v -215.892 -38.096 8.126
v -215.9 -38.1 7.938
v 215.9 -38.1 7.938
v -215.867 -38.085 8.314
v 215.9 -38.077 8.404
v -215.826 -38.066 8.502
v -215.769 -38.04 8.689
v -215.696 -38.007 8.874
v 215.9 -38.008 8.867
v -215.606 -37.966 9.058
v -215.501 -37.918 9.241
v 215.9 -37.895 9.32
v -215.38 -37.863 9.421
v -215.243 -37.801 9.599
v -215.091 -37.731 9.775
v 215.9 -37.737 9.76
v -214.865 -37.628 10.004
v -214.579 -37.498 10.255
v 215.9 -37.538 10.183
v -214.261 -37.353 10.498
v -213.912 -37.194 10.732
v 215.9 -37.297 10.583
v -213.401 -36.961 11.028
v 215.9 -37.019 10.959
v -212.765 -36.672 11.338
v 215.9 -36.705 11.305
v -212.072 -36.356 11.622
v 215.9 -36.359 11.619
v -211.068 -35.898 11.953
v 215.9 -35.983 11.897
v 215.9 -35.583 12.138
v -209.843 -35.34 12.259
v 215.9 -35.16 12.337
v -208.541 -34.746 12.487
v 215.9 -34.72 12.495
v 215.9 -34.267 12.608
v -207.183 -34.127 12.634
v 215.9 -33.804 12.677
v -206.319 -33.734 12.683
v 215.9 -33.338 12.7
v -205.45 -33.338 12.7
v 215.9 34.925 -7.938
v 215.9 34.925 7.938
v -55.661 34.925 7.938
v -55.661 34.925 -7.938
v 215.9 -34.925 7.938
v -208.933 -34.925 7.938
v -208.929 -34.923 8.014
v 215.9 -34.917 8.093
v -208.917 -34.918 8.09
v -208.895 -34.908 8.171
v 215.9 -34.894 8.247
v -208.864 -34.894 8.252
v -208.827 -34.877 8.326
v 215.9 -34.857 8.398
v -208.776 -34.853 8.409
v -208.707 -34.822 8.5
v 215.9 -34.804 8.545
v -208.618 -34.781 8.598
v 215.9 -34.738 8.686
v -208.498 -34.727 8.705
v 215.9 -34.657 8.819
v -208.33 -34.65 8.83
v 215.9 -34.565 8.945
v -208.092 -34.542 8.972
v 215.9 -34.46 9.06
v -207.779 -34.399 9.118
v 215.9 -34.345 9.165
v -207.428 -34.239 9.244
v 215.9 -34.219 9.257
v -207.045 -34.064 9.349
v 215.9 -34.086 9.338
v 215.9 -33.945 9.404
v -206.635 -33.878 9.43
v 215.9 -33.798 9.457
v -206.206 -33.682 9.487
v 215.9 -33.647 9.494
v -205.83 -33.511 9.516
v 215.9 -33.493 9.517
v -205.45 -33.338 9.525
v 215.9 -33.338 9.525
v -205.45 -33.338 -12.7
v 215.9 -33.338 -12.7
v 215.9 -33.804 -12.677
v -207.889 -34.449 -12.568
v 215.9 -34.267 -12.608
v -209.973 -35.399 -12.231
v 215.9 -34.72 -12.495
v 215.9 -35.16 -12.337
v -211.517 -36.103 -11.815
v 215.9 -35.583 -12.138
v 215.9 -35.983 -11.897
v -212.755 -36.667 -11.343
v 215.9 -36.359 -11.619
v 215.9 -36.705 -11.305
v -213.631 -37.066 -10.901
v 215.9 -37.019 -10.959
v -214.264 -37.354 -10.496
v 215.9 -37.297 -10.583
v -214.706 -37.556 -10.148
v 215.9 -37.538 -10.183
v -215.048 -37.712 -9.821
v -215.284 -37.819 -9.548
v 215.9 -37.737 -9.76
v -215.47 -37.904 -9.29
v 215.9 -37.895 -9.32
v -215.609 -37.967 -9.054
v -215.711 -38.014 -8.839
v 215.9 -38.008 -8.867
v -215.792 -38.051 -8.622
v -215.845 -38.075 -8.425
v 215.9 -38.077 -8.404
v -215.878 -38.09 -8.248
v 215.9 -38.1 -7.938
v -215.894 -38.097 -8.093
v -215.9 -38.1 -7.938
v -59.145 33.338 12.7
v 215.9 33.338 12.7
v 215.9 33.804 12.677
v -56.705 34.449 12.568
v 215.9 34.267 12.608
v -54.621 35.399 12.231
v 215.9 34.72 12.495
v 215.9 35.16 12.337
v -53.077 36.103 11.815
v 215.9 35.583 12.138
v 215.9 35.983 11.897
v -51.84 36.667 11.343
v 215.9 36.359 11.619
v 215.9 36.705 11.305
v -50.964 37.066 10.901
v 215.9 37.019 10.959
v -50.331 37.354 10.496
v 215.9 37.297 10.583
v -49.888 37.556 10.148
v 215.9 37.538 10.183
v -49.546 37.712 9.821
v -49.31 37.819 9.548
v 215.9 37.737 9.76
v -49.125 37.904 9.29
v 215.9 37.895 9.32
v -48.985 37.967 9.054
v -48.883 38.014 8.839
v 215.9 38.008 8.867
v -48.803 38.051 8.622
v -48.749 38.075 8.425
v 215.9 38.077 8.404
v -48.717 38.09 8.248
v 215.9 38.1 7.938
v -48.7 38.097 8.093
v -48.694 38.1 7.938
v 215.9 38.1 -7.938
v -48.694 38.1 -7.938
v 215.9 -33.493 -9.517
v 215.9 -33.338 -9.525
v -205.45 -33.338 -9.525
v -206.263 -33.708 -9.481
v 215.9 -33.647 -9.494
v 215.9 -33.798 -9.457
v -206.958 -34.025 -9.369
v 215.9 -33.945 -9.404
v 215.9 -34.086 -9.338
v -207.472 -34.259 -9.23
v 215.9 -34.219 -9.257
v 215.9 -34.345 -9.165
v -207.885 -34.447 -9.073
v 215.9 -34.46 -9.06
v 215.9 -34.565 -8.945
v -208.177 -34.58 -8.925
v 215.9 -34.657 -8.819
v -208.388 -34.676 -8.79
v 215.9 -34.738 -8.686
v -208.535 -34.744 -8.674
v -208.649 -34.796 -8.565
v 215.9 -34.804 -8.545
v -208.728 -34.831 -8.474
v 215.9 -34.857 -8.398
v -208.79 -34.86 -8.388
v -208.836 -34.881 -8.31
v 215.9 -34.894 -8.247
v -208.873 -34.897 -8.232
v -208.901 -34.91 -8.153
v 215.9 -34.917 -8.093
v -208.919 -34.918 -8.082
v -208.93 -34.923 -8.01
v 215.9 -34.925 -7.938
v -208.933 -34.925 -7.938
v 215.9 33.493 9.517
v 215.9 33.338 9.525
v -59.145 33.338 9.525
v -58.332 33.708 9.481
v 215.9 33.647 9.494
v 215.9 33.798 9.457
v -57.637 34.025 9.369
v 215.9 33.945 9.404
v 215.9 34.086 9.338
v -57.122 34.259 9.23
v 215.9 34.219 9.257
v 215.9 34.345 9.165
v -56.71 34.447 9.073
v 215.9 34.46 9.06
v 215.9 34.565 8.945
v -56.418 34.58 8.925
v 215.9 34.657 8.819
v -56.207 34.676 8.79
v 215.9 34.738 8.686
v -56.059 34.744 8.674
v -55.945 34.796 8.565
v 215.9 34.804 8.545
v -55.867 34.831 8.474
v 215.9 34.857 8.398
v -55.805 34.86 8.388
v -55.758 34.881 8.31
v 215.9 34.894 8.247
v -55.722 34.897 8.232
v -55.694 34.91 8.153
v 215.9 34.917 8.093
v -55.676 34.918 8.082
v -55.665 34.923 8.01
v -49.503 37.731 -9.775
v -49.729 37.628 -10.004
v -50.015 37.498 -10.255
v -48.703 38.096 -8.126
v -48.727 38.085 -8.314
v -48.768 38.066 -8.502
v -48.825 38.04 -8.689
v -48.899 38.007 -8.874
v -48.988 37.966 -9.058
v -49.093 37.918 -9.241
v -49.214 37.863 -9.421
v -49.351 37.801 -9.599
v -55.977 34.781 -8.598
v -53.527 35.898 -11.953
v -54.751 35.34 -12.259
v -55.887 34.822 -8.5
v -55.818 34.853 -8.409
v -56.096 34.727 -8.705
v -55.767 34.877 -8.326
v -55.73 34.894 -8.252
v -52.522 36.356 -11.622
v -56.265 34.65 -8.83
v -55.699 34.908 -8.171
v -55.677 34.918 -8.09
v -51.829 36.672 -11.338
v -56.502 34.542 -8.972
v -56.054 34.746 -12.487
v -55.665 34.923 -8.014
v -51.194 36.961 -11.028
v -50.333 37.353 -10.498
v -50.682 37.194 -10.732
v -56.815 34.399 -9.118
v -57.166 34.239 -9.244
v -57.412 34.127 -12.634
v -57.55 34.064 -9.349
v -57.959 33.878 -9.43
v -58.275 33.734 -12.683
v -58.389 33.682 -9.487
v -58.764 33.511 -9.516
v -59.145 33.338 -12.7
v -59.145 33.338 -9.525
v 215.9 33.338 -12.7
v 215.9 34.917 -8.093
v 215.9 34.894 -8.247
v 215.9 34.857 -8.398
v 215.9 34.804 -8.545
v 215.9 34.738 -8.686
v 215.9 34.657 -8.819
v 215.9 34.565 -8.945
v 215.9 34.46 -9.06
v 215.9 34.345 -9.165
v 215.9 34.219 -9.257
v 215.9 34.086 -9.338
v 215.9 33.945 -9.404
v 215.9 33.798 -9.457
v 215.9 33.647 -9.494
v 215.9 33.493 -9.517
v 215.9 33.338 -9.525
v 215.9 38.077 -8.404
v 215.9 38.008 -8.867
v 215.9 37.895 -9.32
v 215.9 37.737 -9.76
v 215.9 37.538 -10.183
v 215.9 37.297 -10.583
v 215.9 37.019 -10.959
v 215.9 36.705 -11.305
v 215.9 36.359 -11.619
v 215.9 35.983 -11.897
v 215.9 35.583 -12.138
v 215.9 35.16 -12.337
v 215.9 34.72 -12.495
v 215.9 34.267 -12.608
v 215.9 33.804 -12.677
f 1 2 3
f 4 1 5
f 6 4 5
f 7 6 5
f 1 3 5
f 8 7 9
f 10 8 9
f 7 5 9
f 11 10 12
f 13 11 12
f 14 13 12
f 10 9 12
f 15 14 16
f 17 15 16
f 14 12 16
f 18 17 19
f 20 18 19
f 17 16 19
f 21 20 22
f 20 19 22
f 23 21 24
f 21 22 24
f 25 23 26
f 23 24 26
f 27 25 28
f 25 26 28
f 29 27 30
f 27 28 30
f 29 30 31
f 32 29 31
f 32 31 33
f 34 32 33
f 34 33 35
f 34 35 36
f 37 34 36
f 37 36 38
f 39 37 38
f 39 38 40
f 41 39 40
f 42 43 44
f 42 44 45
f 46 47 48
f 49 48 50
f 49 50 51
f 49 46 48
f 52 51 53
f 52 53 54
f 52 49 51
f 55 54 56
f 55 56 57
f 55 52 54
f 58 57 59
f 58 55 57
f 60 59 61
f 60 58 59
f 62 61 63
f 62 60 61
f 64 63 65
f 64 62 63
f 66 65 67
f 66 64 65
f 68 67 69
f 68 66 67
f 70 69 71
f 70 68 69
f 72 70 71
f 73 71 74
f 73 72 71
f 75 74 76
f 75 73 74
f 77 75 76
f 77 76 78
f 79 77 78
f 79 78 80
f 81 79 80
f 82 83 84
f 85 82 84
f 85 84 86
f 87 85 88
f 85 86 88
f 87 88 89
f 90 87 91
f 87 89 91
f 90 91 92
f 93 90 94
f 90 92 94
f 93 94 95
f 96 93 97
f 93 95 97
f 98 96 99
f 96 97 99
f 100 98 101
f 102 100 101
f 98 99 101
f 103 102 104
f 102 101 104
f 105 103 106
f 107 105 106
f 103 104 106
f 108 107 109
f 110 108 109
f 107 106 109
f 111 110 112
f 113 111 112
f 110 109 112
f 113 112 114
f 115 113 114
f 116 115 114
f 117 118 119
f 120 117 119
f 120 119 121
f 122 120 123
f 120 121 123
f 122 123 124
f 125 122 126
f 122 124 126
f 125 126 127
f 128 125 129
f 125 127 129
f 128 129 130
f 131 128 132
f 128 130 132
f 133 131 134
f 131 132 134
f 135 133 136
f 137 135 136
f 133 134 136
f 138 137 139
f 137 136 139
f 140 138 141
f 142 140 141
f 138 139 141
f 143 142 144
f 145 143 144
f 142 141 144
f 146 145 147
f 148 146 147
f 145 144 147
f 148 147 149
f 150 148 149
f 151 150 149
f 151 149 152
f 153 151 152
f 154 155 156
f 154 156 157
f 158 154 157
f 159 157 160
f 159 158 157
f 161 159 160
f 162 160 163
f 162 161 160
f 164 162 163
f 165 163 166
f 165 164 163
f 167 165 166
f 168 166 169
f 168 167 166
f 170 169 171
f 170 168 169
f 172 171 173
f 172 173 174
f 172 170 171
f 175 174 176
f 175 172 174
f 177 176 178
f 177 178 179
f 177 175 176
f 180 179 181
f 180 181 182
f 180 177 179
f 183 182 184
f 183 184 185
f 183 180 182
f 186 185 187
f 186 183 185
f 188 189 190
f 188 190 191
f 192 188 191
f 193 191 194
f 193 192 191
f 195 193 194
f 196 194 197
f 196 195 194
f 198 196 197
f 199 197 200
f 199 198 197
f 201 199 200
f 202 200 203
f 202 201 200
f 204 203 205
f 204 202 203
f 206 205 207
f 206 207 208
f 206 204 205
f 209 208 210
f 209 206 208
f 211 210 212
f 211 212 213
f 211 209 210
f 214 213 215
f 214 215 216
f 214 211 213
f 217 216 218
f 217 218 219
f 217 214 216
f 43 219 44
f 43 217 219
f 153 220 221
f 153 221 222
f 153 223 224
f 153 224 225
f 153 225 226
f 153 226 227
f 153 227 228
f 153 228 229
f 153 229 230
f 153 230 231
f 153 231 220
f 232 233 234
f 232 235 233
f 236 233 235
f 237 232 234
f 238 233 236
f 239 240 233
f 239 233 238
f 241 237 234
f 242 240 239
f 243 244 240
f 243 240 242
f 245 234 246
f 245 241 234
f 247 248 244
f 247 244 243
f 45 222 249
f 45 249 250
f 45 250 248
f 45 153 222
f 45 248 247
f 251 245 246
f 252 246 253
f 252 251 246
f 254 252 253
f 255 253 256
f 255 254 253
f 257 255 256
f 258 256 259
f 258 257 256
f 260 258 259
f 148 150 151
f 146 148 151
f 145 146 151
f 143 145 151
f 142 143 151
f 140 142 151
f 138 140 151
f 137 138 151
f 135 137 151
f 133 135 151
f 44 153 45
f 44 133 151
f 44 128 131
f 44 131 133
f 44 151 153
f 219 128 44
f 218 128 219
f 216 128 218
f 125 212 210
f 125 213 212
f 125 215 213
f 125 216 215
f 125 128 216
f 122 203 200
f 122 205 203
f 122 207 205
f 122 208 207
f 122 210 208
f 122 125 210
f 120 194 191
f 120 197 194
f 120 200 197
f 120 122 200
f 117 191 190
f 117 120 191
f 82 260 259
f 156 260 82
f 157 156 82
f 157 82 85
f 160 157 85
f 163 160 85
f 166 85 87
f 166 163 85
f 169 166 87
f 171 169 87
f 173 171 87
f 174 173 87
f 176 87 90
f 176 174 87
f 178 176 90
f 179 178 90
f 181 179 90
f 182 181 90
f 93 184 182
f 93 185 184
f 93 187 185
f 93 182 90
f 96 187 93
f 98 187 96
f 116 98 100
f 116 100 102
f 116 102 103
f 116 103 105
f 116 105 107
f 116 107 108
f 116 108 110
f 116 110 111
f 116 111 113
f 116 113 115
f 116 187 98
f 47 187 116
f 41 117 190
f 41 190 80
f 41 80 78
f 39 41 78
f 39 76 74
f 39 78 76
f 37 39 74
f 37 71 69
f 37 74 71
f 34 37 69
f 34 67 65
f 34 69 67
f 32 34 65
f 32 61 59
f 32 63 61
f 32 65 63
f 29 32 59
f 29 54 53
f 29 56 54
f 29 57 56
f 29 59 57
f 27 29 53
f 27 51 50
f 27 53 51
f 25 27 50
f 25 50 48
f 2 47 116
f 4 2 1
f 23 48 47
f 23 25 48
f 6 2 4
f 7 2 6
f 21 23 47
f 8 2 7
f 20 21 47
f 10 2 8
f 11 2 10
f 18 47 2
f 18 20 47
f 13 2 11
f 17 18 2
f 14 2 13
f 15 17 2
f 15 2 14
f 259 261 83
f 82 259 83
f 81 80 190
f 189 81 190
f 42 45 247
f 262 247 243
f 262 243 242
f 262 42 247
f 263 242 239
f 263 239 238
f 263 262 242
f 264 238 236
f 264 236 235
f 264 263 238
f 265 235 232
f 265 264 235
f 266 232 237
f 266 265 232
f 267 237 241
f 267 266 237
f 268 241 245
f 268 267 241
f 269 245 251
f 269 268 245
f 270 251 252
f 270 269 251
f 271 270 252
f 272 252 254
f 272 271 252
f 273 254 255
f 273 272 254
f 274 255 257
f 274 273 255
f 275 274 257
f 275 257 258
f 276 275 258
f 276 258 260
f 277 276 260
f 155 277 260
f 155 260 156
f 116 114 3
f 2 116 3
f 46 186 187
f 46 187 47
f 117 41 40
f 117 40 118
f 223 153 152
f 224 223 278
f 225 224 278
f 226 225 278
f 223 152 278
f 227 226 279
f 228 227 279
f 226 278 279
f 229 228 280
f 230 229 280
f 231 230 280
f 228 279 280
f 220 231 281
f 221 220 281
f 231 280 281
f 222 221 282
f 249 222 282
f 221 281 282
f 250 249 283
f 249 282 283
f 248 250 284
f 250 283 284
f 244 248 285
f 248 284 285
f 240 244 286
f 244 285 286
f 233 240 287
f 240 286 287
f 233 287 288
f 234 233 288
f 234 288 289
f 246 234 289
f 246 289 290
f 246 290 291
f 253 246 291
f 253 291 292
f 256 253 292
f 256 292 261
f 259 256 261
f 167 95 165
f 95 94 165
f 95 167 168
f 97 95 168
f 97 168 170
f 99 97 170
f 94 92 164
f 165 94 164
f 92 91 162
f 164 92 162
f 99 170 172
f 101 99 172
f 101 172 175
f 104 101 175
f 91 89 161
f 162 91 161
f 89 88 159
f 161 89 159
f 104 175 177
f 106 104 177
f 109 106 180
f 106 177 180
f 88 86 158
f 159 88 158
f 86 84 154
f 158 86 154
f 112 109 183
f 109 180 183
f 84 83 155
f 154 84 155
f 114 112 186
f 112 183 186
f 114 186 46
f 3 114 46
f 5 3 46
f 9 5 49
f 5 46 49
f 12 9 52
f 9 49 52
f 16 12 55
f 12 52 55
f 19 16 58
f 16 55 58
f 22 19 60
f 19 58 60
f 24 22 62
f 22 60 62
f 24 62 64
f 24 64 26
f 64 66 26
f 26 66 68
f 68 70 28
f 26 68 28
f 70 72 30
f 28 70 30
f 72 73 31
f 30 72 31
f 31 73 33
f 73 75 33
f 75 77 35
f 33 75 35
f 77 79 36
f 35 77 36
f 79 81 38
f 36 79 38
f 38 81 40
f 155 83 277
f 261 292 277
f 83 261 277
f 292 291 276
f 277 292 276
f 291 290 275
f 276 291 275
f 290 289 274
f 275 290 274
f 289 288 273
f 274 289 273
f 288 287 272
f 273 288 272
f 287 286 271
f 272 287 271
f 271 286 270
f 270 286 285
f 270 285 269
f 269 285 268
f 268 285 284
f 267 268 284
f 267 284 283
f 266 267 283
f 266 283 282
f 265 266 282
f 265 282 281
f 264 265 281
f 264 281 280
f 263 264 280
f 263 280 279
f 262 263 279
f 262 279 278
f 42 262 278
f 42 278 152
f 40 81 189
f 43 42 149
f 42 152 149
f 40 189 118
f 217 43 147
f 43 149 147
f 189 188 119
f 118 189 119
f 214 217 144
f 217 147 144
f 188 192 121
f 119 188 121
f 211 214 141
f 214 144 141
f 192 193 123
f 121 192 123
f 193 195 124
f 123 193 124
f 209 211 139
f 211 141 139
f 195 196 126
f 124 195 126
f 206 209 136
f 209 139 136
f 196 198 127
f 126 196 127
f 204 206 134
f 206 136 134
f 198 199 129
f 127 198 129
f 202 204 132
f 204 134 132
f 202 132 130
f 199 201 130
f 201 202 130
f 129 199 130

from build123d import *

# Parameters (mm, degrees)
RECTANGULAR_TUBE_3_X_2_X_0_25_1_DEPTH = 431.8
CUT_EXTRUDE1_DEPTH                    = 221.702469402


with BuildPart() as part:
    # Sketch13 → Rectangular tube 3 X 2 X 0.25(1) (new body)
    with BuildSketch(Plane.ZY.offset(-215.9)):
        with BuildLine():
            Line((-7.9375, -38.1), (7.9375, -38.1))
            ThreePointArc((7.9375, -38.1), (11.305096045, -36.705096045), (12.7, -33.3375))
            Line((12.7, -33.3375), (12.7, 33.3375))
            ThreePointArc((12.7, 33.3375), (11.305096045, 36.705096045), (7.9375, 38.1))
            Line((7.9375, 38.1), (-7.9375, 38.1))
            ThreePointArc((-7.9375, 38.1), (-11.305096045, 36.705096045), (-12.7, 33.3375))
            Line((-12.7, 33.3375), (-12.7, -33.3375))
            ThreePointArc((-12.7, -33.3375), (-11.305096045, -36.705096045), (-7.9375, -38.1))
        make_face()
        with BuildLine():
            Line((-7.9375, -34.925), (7.9375, -34.925))
            ThreePointArc((7.9375, -34.925), (9.060032015, -34.460032015), (9.525, -33.3375))
            Line((9.525, -33.3375), (9.525, 33.3375))
            ThreePointArc((9.525, 33.3375), (9.060032015, 34.460032015), (7.9375, 34.925))
            Line((7.9375, 34.925), (-7.9375, 34.925))
            ThreePointArc((-7.9375, 34.925), (-9.060032015, 34.460032015), (-9.525, 33.3375))
            Line((-9.525, 33.3375), (-9.525, -33.3375))
            ThreePointArc((-9.525, -33.3375), (-9.060032015, -34.460032015), (-7.9375, -34.925))
        make_face(mode=Mode.SUBTRACT)
    extrude(amount=RECTANGULAR_TUBE_3_X_2_X_0_25_1_DEPTH)

    # s → Cut-Extrude1 (cut, through all)
    with BuildSketch(Plane.XY.offset(12.7)):
        Polygon((-215.9, -38.1), (-215.9, 38.1), (-48.694360485, 38.1), align=None)
    extrude(amount=-CUT_EXTRUDE1_DEPTH, mode=Mode.SUBTRACT)


solid = part.part
